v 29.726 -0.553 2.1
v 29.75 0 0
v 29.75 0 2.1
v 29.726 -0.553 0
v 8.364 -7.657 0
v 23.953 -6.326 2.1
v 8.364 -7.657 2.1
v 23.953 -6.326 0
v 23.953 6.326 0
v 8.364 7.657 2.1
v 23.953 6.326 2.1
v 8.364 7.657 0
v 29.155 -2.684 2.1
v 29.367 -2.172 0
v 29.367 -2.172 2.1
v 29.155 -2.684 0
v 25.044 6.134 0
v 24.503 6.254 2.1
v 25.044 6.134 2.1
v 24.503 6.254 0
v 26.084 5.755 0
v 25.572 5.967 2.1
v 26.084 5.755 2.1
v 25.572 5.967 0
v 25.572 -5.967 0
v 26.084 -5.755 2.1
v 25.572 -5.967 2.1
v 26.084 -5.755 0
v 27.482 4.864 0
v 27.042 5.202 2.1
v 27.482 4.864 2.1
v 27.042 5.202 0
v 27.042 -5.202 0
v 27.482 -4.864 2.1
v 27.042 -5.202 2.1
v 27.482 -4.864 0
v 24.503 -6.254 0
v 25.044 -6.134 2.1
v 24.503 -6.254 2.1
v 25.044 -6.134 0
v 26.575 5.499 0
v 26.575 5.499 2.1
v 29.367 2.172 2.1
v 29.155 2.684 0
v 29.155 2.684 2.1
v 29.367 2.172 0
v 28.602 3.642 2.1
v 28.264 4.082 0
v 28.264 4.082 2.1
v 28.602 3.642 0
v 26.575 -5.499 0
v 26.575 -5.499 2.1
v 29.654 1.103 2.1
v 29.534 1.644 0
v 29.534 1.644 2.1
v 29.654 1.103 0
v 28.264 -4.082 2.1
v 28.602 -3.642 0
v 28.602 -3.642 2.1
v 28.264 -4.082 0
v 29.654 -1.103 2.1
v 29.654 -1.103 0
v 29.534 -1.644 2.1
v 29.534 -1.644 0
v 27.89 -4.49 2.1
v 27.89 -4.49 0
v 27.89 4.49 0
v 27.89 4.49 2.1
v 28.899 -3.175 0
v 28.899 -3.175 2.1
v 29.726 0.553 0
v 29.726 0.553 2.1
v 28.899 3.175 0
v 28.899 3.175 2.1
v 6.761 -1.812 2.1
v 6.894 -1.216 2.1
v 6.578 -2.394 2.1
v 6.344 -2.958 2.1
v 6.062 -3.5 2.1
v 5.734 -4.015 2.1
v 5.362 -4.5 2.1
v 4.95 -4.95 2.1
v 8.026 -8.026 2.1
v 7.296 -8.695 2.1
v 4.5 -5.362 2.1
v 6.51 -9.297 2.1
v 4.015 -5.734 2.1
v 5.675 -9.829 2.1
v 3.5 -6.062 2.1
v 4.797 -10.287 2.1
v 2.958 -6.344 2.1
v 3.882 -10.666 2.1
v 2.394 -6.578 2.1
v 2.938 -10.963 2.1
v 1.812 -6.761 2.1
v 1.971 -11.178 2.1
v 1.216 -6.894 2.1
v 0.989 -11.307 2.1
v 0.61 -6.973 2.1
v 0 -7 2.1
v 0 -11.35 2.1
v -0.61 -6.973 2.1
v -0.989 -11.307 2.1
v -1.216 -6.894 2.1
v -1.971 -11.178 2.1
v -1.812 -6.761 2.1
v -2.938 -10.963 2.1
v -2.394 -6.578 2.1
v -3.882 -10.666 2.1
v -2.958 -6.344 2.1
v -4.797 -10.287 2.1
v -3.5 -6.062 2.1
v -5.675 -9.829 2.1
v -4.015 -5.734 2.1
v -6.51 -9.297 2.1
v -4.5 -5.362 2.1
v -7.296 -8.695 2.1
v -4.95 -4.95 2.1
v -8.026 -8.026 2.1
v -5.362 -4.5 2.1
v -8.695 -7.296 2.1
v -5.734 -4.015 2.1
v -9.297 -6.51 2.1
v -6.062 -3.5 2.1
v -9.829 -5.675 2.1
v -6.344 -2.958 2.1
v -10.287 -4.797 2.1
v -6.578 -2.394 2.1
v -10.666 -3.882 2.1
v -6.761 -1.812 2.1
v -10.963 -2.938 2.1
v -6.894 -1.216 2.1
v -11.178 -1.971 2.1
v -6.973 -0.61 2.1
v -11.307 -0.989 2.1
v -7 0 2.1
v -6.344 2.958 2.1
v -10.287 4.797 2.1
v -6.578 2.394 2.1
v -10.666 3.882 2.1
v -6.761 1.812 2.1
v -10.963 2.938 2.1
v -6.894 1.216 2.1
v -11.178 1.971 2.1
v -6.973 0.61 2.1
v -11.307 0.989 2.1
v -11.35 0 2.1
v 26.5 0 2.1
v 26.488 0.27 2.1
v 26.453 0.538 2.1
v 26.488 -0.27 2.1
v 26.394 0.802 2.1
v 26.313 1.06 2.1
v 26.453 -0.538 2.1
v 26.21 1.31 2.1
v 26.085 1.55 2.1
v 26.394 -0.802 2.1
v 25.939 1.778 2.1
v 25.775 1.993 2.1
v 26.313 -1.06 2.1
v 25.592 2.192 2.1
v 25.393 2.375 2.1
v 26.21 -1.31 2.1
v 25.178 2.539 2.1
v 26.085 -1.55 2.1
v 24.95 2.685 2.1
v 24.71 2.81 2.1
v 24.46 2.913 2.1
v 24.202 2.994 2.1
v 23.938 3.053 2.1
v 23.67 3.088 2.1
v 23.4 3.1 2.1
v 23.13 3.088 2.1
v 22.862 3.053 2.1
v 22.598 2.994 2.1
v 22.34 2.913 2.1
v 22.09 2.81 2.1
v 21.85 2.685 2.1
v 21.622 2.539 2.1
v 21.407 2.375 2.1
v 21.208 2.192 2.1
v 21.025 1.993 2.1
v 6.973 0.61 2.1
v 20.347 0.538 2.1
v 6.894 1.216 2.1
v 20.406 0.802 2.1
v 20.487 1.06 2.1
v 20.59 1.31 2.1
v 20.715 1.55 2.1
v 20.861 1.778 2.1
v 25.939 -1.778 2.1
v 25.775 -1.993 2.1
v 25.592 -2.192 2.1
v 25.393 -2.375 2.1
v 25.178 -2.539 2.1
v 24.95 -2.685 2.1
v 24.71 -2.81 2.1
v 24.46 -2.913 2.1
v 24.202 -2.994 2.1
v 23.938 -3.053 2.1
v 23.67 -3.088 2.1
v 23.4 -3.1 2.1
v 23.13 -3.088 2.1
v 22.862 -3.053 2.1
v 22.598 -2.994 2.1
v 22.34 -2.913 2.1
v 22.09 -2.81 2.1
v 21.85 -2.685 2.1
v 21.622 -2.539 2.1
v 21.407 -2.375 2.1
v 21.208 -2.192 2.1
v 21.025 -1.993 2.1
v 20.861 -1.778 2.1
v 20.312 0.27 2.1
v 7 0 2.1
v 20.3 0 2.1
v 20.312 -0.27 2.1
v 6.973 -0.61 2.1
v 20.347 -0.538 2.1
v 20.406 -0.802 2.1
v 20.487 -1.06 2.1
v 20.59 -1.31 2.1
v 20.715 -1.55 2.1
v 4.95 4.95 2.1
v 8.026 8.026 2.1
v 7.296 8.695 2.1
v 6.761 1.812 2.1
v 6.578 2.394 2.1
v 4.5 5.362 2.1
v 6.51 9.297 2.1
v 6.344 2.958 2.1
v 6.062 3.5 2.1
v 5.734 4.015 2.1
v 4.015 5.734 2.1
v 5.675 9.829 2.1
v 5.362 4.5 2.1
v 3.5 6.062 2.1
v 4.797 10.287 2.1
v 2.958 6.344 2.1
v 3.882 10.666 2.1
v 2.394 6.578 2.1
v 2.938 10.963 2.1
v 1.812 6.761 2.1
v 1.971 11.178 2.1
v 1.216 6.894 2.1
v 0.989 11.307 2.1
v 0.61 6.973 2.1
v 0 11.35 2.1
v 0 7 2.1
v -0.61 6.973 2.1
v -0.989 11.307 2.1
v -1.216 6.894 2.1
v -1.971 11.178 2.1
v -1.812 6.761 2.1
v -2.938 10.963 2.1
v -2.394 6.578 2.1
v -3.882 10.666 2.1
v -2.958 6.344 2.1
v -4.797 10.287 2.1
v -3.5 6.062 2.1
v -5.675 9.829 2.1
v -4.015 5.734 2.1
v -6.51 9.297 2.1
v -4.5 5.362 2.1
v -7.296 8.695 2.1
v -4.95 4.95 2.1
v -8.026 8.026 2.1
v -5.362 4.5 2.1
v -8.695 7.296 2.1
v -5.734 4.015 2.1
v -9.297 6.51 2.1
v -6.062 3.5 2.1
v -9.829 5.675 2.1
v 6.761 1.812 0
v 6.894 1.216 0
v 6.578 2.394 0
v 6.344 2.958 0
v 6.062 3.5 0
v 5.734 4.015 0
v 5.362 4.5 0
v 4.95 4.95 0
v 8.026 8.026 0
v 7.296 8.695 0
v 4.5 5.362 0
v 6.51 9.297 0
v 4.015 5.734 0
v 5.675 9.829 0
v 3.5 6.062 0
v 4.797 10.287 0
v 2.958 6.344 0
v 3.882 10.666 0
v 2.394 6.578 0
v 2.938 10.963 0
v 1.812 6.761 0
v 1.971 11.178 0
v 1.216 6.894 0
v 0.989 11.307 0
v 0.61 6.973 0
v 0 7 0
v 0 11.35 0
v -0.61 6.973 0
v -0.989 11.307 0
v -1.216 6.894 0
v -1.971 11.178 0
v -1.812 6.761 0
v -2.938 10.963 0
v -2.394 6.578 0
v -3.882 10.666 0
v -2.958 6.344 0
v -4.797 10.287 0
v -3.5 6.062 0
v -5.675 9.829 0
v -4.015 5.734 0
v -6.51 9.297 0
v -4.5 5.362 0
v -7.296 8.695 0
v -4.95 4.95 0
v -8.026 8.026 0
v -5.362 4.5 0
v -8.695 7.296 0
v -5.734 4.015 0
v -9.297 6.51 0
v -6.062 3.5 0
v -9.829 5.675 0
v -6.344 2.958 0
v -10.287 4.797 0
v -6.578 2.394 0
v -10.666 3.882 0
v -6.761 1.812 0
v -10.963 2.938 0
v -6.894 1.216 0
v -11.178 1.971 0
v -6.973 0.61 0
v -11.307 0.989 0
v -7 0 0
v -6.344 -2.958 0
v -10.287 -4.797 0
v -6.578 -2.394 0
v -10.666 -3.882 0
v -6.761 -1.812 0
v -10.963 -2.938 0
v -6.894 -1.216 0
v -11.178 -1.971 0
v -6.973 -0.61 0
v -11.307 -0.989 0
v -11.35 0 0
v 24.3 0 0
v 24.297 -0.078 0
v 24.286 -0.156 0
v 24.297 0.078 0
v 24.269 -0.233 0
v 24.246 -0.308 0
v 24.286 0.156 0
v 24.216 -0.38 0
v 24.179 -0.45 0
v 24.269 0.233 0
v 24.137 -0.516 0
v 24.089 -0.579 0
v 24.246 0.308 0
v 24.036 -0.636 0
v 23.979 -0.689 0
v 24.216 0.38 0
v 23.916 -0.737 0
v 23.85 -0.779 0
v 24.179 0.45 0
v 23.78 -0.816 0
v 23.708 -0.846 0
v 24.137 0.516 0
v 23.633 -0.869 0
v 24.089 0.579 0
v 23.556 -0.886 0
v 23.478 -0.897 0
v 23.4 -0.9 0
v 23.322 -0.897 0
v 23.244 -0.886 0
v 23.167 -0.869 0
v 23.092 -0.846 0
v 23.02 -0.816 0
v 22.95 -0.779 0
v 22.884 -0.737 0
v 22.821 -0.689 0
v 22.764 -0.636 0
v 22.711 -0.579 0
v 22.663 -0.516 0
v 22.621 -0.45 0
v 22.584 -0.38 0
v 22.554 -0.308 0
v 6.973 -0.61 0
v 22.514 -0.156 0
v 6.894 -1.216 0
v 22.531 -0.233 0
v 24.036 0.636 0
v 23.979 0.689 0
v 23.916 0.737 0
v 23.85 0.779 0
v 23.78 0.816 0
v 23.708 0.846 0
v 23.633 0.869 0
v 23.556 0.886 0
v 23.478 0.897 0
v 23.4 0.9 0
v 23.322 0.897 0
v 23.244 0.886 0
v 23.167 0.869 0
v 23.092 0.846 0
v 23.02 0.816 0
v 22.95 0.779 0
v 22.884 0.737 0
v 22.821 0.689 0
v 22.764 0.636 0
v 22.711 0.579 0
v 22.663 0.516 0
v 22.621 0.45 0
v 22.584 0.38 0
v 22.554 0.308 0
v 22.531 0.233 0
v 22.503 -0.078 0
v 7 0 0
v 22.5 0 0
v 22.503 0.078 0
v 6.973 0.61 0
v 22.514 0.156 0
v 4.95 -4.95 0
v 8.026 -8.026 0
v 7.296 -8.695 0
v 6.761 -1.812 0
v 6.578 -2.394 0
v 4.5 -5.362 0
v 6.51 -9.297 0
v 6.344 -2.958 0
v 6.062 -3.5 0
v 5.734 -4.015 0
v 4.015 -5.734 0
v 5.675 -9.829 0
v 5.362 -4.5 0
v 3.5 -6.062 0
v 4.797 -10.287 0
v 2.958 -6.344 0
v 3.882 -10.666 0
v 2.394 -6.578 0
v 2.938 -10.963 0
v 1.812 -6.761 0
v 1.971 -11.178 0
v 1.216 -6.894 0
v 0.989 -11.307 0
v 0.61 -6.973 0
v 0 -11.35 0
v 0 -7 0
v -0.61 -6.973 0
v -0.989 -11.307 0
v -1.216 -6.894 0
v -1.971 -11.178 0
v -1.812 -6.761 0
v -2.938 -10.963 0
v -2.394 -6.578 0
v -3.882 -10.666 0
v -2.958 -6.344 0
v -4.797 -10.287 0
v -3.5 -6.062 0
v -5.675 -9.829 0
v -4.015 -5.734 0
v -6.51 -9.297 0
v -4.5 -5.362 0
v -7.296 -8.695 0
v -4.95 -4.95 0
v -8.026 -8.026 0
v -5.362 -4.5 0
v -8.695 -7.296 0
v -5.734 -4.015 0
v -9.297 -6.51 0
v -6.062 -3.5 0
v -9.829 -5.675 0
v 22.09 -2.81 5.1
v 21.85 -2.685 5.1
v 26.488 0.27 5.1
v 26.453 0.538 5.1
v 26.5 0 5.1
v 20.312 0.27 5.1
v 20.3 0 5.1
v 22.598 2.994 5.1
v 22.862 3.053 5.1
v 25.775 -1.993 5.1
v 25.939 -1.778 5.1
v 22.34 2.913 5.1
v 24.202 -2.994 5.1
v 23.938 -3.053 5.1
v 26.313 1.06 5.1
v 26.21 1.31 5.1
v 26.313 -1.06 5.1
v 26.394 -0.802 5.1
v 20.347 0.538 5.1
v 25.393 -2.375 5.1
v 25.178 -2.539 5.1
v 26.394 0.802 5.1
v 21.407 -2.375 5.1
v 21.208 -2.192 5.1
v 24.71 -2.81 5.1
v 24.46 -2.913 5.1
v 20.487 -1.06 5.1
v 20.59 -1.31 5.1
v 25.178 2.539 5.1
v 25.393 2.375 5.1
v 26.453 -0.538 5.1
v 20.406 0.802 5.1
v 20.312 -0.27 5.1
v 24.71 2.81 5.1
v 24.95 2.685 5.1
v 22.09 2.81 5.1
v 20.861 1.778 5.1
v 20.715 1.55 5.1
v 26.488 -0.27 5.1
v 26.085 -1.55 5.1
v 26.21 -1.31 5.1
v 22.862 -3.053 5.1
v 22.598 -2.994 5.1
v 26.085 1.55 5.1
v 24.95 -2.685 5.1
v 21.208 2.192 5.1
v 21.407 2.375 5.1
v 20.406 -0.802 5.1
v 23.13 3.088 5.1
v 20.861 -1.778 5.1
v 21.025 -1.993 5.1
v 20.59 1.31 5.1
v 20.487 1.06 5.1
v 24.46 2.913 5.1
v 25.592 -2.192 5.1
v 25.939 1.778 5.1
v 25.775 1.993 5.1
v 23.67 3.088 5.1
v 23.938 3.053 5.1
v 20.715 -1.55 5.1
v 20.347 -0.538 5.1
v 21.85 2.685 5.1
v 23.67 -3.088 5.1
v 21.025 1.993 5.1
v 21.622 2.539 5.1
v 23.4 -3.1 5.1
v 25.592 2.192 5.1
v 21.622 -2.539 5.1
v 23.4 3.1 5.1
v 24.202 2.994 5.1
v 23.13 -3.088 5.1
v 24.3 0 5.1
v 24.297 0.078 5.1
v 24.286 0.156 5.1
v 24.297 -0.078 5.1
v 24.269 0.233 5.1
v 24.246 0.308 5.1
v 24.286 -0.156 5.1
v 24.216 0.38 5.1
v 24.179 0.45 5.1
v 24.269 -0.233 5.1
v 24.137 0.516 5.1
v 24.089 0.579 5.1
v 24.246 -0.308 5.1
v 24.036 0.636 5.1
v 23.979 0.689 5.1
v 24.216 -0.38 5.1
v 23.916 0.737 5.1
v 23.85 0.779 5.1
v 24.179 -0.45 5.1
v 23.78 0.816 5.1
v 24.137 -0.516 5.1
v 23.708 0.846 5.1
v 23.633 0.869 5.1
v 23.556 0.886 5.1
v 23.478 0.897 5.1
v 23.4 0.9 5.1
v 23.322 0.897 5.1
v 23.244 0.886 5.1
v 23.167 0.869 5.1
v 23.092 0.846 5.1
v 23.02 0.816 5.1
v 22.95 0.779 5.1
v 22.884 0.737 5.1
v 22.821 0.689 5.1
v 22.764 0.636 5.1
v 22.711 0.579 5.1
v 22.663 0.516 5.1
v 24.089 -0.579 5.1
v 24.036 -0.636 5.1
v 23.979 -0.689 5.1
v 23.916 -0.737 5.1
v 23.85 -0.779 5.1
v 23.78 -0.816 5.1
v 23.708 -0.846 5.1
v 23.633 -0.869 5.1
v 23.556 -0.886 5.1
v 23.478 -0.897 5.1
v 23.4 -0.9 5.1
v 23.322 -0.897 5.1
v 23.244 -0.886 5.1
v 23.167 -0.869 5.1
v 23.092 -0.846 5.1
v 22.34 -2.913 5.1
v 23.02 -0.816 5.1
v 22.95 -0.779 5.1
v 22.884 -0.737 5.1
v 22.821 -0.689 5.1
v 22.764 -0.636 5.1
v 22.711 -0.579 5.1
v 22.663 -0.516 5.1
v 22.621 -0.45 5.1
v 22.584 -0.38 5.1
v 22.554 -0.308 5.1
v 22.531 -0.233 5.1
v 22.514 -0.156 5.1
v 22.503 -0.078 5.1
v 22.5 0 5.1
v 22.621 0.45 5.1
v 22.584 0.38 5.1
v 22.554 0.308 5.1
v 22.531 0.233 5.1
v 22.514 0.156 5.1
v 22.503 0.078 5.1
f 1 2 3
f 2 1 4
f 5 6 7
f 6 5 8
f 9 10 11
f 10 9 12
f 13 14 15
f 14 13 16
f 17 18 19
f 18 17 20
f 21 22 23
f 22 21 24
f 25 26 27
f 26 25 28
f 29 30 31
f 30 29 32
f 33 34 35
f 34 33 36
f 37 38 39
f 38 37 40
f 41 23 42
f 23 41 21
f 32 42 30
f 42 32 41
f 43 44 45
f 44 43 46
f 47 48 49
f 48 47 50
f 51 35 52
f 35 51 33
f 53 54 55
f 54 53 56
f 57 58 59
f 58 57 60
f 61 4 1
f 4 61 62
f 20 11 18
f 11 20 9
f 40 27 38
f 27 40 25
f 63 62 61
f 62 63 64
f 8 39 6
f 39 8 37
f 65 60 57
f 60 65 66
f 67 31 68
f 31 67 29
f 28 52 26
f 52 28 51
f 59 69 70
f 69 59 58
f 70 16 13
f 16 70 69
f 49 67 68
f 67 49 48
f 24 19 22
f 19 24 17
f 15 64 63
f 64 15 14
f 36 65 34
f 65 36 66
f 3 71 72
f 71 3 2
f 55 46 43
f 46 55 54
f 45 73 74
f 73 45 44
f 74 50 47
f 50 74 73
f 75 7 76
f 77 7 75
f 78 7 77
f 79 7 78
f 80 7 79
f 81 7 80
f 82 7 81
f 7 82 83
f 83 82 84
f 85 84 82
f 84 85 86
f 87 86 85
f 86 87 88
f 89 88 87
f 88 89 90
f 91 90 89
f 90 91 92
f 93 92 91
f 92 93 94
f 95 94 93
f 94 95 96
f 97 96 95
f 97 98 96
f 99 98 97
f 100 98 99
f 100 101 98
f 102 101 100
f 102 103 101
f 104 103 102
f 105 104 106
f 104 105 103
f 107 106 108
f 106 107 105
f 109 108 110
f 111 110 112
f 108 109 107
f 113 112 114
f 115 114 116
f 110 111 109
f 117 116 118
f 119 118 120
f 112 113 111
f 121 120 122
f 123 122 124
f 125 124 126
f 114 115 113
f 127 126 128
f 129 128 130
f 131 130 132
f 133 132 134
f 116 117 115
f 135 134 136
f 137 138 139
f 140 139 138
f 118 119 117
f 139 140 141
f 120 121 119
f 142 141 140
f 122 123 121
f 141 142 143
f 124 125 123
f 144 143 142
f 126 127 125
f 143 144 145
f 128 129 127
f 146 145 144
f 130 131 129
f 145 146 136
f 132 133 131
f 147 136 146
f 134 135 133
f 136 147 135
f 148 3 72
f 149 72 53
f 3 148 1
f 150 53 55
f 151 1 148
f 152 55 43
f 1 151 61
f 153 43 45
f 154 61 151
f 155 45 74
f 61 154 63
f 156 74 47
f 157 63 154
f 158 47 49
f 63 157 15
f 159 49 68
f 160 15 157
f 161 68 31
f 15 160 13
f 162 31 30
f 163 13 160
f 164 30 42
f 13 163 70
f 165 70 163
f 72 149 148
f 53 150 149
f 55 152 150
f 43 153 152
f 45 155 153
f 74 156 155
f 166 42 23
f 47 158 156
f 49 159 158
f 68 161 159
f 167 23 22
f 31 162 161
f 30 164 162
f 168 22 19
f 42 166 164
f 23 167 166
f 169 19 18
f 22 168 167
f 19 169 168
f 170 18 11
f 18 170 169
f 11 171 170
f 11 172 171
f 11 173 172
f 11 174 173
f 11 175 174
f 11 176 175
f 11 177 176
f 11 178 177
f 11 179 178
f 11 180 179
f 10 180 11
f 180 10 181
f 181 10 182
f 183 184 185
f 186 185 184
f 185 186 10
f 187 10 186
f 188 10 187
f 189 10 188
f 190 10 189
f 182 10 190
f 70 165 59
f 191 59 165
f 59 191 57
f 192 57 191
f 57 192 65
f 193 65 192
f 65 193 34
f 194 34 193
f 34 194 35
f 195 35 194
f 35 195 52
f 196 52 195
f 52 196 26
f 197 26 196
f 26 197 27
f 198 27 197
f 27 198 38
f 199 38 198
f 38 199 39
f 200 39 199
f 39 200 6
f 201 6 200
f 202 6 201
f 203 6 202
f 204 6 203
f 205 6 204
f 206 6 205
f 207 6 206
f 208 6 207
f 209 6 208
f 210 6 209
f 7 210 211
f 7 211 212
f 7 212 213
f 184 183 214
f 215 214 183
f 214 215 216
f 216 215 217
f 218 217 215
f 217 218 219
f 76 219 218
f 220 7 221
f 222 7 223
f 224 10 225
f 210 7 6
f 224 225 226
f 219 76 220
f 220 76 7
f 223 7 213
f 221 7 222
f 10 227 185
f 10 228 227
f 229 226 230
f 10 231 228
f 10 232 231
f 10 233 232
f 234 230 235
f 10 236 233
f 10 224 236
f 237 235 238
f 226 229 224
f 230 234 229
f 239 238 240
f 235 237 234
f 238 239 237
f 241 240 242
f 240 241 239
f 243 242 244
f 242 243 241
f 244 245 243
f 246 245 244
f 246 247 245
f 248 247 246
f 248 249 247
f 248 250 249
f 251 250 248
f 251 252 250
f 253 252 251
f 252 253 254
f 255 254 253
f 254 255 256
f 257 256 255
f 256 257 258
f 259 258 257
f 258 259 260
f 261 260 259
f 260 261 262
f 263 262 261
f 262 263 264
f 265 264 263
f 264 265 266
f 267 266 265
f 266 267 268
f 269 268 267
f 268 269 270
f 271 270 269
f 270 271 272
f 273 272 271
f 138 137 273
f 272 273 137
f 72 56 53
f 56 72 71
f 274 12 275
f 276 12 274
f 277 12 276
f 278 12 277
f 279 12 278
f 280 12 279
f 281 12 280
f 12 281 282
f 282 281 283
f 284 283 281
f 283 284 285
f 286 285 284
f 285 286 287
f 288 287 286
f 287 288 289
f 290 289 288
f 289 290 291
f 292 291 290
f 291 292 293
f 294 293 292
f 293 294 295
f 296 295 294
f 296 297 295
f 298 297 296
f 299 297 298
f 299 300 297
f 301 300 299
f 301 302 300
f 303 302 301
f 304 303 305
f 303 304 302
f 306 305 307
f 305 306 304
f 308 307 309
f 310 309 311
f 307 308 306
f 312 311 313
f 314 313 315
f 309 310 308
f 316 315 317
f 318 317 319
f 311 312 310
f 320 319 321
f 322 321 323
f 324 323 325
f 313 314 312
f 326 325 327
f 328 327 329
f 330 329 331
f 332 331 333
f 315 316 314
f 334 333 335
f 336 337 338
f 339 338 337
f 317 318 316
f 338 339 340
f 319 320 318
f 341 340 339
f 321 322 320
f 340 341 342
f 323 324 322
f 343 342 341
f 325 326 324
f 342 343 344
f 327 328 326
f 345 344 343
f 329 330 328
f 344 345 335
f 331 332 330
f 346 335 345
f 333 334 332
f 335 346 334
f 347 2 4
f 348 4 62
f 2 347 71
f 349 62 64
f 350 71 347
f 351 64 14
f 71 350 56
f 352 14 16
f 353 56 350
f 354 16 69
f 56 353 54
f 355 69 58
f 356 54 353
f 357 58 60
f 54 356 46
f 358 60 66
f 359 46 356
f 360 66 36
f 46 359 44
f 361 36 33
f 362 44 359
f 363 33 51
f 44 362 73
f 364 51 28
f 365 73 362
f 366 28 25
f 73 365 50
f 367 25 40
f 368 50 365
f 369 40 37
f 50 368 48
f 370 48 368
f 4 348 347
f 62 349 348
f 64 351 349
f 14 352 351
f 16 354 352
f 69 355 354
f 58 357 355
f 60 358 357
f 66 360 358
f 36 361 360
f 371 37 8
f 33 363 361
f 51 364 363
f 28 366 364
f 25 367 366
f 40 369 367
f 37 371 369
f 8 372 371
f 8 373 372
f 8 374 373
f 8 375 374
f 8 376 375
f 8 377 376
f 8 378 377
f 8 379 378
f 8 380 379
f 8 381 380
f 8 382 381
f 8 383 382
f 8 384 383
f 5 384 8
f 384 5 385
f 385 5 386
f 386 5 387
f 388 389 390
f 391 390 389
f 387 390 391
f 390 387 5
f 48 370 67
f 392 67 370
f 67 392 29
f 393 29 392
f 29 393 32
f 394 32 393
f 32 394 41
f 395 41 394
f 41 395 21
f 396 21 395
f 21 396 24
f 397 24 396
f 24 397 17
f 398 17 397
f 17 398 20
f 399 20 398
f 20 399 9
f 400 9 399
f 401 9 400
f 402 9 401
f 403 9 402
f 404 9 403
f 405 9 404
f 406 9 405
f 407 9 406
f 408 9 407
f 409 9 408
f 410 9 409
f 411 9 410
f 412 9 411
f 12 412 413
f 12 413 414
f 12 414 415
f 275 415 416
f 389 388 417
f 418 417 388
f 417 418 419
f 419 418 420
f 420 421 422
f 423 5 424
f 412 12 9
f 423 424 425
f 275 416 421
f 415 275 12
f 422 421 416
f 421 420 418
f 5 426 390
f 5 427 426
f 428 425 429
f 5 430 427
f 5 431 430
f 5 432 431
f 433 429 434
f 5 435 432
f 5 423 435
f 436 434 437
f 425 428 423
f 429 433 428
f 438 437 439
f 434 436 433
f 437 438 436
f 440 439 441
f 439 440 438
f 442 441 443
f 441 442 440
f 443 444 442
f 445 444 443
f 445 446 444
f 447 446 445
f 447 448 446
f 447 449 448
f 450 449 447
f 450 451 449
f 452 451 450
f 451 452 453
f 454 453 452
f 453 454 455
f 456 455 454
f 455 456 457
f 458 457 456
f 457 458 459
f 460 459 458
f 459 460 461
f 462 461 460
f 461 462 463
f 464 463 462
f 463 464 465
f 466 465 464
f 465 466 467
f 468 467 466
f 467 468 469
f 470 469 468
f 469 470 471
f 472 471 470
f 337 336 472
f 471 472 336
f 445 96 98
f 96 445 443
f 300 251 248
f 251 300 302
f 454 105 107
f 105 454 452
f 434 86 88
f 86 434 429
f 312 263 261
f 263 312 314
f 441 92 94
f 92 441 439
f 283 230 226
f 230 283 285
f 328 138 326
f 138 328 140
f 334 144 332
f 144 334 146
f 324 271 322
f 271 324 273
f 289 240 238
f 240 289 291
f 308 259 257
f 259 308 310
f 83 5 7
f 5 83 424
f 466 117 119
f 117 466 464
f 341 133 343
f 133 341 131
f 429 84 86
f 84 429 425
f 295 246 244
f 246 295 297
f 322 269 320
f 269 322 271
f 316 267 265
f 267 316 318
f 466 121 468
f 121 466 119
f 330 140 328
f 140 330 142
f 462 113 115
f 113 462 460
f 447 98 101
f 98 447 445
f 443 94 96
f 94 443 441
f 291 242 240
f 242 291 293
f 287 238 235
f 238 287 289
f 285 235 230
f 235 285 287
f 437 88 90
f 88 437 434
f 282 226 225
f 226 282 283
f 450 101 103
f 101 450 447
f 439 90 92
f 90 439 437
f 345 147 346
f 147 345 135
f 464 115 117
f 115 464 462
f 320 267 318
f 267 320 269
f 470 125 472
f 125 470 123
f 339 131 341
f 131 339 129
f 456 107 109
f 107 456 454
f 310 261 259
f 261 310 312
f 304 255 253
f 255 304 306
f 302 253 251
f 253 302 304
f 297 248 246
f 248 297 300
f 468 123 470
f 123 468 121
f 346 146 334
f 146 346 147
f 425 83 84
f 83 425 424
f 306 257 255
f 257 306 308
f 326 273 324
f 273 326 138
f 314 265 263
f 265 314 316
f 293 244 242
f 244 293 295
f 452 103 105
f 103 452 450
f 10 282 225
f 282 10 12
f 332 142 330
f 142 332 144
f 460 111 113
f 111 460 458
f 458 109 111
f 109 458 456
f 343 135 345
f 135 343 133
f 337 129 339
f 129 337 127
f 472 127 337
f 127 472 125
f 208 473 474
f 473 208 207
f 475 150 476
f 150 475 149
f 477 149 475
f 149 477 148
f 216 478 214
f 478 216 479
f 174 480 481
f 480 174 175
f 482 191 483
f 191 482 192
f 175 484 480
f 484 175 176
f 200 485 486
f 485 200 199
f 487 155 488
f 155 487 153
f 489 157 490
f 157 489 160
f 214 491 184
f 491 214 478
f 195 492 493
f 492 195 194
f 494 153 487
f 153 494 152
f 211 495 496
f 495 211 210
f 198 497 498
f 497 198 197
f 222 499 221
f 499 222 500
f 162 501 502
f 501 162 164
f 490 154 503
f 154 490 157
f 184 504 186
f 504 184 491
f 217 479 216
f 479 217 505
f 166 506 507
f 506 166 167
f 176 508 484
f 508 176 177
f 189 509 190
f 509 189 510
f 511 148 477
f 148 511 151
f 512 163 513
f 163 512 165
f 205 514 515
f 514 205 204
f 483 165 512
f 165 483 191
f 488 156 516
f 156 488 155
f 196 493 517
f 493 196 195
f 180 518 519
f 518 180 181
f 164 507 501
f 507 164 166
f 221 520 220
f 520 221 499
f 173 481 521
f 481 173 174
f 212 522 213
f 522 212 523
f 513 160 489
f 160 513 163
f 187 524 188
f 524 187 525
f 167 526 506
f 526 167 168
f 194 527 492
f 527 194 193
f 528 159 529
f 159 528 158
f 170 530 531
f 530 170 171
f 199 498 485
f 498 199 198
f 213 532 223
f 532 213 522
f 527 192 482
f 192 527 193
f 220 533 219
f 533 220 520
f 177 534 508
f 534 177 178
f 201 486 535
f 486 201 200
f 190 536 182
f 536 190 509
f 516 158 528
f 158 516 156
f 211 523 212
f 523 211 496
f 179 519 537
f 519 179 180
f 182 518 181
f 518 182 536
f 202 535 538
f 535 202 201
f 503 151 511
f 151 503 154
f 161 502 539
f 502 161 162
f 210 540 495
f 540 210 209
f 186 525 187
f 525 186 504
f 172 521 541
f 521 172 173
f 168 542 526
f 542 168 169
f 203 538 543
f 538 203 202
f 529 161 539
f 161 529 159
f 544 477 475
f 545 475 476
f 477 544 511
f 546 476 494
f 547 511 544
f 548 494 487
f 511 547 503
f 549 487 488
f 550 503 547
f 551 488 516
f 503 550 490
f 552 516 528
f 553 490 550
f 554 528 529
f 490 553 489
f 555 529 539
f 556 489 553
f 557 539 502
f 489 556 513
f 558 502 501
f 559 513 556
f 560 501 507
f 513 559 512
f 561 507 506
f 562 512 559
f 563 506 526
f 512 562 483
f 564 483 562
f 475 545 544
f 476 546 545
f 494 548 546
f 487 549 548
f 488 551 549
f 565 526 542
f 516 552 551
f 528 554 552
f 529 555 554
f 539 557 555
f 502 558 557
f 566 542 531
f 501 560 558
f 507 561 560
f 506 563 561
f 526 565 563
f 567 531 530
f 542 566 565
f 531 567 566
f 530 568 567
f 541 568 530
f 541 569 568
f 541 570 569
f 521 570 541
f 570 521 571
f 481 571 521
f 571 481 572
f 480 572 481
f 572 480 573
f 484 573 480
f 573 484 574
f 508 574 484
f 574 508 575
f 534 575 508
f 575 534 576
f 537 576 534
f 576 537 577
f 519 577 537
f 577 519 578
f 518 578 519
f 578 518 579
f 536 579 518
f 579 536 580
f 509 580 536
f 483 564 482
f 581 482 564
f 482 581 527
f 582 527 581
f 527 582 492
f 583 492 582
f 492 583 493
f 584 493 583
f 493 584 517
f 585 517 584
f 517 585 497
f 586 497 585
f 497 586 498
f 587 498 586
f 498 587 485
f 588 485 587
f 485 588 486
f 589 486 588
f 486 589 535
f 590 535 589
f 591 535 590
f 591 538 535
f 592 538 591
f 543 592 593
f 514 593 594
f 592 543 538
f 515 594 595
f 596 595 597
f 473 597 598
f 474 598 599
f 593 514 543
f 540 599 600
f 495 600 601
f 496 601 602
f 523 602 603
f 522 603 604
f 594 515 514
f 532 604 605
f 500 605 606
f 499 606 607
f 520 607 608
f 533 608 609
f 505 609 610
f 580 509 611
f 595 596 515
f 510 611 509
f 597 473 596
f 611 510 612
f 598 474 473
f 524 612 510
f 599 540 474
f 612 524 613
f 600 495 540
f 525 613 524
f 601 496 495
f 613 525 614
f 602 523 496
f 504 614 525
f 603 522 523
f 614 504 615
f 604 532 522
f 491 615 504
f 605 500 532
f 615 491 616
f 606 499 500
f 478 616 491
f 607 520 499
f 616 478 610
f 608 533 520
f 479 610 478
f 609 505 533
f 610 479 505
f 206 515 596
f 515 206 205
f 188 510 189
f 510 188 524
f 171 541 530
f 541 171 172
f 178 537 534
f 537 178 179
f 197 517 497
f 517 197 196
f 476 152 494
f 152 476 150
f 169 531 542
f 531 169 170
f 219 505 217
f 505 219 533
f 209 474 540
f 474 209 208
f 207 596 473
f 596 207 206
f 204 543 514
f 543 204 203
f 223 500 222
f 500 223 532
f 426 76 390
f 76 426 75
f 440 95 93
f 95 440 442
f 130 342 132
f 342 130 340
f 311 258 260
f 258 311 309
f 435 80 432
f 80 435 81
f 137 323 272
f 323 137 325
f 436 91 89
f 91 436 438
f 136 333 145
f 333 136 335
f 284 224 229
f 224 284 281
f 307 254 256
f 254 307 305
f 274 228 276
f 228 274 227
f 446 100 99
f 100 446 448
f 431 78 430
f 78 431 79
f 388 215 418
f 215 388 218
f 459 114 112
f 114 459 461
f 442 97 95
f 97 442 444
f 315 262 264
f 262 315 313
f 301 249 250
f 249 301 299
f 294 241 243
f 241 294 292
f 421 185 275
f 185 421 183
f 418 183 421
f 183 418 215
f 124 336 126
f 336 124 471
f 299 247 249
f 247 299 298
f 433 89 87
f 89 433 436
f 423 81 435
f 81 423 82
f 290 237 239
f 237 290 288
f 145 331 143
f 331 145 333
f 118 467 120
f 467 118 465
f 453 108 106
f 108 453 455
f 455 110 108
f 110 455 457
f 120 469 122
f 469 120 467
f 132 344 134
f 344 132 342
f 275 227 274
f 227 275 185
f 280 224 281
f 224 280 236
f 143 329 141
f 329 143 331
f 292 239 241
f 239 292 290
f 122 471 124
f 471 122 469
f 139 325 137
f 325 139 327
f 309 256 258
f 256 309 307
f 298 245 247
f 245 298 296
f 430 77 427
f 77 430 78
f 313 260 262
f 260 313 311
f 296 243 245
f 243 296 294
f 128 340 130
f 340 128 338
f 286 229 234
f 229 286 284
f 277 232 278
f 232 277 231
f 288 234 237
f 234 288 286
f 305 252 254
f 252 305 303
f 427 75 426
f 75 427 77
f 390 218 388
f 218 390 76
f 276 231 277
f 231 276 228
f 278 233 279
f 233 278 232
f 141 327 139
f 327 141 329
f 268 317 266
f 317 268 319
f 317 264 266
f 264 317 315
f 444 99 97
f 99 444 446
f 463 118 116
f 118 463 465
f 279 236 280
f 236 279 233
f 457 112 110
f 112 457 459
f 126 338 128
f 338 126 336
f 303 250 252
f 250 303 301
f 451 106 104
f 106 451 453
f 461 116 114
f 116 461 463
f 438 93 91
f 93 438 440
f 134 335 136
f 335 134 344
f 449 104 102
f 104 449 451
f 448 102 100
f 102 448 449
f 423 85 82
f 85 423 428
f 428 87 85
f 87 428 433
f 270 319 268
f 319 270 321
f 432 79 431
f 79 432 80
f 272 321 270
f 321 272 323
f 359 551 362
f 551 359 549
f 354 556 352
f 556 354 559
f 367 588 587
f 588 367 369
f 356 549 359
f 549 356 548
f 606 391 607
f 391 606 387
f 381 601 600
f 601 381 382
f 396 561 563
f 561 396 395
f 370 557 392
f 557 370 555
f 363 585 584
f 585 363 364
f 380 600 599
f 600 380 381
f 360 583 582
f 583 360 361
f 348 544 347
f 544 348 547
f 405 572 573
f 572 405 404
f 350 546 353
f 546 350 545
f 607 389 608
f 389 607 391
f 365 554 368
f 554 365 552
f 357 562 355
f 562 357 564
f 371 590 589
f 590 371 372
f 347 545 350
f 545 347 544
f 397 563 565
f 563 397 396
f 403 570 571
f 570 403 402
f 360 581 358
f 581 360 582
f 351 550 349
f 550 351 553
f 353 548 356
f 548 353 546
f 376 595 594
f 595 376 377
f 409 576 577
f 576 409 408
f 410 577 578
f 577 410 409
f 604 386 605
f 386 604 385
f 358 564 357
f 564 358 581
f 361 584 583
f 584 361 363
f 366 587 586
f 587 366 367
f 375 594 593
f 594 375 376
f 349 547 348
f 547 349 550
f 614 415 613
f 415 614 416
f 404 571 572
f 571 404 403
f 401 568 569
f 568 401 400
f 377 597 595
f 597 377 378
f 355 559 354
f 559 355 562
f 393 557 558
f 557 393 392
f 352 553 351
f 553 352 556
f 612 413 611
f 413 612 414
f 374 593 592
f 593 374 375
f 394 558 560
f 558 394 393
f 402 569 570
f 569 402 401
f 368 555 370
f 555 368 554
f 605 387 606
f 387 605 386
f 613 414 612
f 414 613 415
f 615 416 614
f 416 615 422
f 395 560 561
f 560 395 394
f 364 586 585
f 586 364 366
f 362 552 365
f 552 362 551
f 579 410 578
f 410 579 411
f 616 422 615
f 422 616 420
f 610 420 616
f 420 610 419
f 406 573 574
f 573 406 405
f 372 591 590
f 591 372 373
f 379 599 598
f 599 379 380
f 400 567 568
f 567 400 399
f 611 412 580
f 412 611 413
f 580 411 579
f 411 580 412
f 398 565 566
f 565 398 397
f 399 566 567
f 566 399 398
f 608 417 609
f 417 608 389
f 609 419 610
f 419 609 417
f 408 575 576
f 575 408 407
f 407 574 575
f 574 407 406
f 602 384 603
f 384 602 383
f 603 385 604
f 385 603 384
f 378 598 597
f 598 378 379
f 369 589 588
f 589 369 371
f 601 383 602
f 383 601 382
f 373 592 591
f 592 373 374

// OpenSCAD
// This is a replacement weight holder for a sonic shaking ghost toy.
//
// There were several different designs over generations of the toy,
// and this copies one of them, but should work for ones with a
// T-shaped weight that goes completely through a hole.
//
// You will probably need to drill out the holes for a good fit.
// I found a 5/16 inch drill bit was about right.
//
// You will need to glue the weight in.

base_h = 2.1;
base_l = 33 - 0.5*(6.2+13);
big_d = 16;
small_d = 12.7;

disc_d = 22.7;

support_h = 5.1;
support_d = 6.2;

hole_d = 1.8;
weight_d = 14;

$fn = $preview ? 24 : 72;


difference() {
  union() {
    hull() {
      translate([4,0,0]) cylinder(h=base_h, d=big_d);
      translate([base_l,0,0]) cylinder(h=base_h, d=small_d);
    }
    cylinder(h=base_h, d=disc_d);
    translate([base_l,0,0]) cylinder(h=support_h, d=support_d);
  }
  cylinder(h=base_h, d=weight_d);
  translate([base_l,0,0]) cylinder(h=support_h, d=hole_d);
}
